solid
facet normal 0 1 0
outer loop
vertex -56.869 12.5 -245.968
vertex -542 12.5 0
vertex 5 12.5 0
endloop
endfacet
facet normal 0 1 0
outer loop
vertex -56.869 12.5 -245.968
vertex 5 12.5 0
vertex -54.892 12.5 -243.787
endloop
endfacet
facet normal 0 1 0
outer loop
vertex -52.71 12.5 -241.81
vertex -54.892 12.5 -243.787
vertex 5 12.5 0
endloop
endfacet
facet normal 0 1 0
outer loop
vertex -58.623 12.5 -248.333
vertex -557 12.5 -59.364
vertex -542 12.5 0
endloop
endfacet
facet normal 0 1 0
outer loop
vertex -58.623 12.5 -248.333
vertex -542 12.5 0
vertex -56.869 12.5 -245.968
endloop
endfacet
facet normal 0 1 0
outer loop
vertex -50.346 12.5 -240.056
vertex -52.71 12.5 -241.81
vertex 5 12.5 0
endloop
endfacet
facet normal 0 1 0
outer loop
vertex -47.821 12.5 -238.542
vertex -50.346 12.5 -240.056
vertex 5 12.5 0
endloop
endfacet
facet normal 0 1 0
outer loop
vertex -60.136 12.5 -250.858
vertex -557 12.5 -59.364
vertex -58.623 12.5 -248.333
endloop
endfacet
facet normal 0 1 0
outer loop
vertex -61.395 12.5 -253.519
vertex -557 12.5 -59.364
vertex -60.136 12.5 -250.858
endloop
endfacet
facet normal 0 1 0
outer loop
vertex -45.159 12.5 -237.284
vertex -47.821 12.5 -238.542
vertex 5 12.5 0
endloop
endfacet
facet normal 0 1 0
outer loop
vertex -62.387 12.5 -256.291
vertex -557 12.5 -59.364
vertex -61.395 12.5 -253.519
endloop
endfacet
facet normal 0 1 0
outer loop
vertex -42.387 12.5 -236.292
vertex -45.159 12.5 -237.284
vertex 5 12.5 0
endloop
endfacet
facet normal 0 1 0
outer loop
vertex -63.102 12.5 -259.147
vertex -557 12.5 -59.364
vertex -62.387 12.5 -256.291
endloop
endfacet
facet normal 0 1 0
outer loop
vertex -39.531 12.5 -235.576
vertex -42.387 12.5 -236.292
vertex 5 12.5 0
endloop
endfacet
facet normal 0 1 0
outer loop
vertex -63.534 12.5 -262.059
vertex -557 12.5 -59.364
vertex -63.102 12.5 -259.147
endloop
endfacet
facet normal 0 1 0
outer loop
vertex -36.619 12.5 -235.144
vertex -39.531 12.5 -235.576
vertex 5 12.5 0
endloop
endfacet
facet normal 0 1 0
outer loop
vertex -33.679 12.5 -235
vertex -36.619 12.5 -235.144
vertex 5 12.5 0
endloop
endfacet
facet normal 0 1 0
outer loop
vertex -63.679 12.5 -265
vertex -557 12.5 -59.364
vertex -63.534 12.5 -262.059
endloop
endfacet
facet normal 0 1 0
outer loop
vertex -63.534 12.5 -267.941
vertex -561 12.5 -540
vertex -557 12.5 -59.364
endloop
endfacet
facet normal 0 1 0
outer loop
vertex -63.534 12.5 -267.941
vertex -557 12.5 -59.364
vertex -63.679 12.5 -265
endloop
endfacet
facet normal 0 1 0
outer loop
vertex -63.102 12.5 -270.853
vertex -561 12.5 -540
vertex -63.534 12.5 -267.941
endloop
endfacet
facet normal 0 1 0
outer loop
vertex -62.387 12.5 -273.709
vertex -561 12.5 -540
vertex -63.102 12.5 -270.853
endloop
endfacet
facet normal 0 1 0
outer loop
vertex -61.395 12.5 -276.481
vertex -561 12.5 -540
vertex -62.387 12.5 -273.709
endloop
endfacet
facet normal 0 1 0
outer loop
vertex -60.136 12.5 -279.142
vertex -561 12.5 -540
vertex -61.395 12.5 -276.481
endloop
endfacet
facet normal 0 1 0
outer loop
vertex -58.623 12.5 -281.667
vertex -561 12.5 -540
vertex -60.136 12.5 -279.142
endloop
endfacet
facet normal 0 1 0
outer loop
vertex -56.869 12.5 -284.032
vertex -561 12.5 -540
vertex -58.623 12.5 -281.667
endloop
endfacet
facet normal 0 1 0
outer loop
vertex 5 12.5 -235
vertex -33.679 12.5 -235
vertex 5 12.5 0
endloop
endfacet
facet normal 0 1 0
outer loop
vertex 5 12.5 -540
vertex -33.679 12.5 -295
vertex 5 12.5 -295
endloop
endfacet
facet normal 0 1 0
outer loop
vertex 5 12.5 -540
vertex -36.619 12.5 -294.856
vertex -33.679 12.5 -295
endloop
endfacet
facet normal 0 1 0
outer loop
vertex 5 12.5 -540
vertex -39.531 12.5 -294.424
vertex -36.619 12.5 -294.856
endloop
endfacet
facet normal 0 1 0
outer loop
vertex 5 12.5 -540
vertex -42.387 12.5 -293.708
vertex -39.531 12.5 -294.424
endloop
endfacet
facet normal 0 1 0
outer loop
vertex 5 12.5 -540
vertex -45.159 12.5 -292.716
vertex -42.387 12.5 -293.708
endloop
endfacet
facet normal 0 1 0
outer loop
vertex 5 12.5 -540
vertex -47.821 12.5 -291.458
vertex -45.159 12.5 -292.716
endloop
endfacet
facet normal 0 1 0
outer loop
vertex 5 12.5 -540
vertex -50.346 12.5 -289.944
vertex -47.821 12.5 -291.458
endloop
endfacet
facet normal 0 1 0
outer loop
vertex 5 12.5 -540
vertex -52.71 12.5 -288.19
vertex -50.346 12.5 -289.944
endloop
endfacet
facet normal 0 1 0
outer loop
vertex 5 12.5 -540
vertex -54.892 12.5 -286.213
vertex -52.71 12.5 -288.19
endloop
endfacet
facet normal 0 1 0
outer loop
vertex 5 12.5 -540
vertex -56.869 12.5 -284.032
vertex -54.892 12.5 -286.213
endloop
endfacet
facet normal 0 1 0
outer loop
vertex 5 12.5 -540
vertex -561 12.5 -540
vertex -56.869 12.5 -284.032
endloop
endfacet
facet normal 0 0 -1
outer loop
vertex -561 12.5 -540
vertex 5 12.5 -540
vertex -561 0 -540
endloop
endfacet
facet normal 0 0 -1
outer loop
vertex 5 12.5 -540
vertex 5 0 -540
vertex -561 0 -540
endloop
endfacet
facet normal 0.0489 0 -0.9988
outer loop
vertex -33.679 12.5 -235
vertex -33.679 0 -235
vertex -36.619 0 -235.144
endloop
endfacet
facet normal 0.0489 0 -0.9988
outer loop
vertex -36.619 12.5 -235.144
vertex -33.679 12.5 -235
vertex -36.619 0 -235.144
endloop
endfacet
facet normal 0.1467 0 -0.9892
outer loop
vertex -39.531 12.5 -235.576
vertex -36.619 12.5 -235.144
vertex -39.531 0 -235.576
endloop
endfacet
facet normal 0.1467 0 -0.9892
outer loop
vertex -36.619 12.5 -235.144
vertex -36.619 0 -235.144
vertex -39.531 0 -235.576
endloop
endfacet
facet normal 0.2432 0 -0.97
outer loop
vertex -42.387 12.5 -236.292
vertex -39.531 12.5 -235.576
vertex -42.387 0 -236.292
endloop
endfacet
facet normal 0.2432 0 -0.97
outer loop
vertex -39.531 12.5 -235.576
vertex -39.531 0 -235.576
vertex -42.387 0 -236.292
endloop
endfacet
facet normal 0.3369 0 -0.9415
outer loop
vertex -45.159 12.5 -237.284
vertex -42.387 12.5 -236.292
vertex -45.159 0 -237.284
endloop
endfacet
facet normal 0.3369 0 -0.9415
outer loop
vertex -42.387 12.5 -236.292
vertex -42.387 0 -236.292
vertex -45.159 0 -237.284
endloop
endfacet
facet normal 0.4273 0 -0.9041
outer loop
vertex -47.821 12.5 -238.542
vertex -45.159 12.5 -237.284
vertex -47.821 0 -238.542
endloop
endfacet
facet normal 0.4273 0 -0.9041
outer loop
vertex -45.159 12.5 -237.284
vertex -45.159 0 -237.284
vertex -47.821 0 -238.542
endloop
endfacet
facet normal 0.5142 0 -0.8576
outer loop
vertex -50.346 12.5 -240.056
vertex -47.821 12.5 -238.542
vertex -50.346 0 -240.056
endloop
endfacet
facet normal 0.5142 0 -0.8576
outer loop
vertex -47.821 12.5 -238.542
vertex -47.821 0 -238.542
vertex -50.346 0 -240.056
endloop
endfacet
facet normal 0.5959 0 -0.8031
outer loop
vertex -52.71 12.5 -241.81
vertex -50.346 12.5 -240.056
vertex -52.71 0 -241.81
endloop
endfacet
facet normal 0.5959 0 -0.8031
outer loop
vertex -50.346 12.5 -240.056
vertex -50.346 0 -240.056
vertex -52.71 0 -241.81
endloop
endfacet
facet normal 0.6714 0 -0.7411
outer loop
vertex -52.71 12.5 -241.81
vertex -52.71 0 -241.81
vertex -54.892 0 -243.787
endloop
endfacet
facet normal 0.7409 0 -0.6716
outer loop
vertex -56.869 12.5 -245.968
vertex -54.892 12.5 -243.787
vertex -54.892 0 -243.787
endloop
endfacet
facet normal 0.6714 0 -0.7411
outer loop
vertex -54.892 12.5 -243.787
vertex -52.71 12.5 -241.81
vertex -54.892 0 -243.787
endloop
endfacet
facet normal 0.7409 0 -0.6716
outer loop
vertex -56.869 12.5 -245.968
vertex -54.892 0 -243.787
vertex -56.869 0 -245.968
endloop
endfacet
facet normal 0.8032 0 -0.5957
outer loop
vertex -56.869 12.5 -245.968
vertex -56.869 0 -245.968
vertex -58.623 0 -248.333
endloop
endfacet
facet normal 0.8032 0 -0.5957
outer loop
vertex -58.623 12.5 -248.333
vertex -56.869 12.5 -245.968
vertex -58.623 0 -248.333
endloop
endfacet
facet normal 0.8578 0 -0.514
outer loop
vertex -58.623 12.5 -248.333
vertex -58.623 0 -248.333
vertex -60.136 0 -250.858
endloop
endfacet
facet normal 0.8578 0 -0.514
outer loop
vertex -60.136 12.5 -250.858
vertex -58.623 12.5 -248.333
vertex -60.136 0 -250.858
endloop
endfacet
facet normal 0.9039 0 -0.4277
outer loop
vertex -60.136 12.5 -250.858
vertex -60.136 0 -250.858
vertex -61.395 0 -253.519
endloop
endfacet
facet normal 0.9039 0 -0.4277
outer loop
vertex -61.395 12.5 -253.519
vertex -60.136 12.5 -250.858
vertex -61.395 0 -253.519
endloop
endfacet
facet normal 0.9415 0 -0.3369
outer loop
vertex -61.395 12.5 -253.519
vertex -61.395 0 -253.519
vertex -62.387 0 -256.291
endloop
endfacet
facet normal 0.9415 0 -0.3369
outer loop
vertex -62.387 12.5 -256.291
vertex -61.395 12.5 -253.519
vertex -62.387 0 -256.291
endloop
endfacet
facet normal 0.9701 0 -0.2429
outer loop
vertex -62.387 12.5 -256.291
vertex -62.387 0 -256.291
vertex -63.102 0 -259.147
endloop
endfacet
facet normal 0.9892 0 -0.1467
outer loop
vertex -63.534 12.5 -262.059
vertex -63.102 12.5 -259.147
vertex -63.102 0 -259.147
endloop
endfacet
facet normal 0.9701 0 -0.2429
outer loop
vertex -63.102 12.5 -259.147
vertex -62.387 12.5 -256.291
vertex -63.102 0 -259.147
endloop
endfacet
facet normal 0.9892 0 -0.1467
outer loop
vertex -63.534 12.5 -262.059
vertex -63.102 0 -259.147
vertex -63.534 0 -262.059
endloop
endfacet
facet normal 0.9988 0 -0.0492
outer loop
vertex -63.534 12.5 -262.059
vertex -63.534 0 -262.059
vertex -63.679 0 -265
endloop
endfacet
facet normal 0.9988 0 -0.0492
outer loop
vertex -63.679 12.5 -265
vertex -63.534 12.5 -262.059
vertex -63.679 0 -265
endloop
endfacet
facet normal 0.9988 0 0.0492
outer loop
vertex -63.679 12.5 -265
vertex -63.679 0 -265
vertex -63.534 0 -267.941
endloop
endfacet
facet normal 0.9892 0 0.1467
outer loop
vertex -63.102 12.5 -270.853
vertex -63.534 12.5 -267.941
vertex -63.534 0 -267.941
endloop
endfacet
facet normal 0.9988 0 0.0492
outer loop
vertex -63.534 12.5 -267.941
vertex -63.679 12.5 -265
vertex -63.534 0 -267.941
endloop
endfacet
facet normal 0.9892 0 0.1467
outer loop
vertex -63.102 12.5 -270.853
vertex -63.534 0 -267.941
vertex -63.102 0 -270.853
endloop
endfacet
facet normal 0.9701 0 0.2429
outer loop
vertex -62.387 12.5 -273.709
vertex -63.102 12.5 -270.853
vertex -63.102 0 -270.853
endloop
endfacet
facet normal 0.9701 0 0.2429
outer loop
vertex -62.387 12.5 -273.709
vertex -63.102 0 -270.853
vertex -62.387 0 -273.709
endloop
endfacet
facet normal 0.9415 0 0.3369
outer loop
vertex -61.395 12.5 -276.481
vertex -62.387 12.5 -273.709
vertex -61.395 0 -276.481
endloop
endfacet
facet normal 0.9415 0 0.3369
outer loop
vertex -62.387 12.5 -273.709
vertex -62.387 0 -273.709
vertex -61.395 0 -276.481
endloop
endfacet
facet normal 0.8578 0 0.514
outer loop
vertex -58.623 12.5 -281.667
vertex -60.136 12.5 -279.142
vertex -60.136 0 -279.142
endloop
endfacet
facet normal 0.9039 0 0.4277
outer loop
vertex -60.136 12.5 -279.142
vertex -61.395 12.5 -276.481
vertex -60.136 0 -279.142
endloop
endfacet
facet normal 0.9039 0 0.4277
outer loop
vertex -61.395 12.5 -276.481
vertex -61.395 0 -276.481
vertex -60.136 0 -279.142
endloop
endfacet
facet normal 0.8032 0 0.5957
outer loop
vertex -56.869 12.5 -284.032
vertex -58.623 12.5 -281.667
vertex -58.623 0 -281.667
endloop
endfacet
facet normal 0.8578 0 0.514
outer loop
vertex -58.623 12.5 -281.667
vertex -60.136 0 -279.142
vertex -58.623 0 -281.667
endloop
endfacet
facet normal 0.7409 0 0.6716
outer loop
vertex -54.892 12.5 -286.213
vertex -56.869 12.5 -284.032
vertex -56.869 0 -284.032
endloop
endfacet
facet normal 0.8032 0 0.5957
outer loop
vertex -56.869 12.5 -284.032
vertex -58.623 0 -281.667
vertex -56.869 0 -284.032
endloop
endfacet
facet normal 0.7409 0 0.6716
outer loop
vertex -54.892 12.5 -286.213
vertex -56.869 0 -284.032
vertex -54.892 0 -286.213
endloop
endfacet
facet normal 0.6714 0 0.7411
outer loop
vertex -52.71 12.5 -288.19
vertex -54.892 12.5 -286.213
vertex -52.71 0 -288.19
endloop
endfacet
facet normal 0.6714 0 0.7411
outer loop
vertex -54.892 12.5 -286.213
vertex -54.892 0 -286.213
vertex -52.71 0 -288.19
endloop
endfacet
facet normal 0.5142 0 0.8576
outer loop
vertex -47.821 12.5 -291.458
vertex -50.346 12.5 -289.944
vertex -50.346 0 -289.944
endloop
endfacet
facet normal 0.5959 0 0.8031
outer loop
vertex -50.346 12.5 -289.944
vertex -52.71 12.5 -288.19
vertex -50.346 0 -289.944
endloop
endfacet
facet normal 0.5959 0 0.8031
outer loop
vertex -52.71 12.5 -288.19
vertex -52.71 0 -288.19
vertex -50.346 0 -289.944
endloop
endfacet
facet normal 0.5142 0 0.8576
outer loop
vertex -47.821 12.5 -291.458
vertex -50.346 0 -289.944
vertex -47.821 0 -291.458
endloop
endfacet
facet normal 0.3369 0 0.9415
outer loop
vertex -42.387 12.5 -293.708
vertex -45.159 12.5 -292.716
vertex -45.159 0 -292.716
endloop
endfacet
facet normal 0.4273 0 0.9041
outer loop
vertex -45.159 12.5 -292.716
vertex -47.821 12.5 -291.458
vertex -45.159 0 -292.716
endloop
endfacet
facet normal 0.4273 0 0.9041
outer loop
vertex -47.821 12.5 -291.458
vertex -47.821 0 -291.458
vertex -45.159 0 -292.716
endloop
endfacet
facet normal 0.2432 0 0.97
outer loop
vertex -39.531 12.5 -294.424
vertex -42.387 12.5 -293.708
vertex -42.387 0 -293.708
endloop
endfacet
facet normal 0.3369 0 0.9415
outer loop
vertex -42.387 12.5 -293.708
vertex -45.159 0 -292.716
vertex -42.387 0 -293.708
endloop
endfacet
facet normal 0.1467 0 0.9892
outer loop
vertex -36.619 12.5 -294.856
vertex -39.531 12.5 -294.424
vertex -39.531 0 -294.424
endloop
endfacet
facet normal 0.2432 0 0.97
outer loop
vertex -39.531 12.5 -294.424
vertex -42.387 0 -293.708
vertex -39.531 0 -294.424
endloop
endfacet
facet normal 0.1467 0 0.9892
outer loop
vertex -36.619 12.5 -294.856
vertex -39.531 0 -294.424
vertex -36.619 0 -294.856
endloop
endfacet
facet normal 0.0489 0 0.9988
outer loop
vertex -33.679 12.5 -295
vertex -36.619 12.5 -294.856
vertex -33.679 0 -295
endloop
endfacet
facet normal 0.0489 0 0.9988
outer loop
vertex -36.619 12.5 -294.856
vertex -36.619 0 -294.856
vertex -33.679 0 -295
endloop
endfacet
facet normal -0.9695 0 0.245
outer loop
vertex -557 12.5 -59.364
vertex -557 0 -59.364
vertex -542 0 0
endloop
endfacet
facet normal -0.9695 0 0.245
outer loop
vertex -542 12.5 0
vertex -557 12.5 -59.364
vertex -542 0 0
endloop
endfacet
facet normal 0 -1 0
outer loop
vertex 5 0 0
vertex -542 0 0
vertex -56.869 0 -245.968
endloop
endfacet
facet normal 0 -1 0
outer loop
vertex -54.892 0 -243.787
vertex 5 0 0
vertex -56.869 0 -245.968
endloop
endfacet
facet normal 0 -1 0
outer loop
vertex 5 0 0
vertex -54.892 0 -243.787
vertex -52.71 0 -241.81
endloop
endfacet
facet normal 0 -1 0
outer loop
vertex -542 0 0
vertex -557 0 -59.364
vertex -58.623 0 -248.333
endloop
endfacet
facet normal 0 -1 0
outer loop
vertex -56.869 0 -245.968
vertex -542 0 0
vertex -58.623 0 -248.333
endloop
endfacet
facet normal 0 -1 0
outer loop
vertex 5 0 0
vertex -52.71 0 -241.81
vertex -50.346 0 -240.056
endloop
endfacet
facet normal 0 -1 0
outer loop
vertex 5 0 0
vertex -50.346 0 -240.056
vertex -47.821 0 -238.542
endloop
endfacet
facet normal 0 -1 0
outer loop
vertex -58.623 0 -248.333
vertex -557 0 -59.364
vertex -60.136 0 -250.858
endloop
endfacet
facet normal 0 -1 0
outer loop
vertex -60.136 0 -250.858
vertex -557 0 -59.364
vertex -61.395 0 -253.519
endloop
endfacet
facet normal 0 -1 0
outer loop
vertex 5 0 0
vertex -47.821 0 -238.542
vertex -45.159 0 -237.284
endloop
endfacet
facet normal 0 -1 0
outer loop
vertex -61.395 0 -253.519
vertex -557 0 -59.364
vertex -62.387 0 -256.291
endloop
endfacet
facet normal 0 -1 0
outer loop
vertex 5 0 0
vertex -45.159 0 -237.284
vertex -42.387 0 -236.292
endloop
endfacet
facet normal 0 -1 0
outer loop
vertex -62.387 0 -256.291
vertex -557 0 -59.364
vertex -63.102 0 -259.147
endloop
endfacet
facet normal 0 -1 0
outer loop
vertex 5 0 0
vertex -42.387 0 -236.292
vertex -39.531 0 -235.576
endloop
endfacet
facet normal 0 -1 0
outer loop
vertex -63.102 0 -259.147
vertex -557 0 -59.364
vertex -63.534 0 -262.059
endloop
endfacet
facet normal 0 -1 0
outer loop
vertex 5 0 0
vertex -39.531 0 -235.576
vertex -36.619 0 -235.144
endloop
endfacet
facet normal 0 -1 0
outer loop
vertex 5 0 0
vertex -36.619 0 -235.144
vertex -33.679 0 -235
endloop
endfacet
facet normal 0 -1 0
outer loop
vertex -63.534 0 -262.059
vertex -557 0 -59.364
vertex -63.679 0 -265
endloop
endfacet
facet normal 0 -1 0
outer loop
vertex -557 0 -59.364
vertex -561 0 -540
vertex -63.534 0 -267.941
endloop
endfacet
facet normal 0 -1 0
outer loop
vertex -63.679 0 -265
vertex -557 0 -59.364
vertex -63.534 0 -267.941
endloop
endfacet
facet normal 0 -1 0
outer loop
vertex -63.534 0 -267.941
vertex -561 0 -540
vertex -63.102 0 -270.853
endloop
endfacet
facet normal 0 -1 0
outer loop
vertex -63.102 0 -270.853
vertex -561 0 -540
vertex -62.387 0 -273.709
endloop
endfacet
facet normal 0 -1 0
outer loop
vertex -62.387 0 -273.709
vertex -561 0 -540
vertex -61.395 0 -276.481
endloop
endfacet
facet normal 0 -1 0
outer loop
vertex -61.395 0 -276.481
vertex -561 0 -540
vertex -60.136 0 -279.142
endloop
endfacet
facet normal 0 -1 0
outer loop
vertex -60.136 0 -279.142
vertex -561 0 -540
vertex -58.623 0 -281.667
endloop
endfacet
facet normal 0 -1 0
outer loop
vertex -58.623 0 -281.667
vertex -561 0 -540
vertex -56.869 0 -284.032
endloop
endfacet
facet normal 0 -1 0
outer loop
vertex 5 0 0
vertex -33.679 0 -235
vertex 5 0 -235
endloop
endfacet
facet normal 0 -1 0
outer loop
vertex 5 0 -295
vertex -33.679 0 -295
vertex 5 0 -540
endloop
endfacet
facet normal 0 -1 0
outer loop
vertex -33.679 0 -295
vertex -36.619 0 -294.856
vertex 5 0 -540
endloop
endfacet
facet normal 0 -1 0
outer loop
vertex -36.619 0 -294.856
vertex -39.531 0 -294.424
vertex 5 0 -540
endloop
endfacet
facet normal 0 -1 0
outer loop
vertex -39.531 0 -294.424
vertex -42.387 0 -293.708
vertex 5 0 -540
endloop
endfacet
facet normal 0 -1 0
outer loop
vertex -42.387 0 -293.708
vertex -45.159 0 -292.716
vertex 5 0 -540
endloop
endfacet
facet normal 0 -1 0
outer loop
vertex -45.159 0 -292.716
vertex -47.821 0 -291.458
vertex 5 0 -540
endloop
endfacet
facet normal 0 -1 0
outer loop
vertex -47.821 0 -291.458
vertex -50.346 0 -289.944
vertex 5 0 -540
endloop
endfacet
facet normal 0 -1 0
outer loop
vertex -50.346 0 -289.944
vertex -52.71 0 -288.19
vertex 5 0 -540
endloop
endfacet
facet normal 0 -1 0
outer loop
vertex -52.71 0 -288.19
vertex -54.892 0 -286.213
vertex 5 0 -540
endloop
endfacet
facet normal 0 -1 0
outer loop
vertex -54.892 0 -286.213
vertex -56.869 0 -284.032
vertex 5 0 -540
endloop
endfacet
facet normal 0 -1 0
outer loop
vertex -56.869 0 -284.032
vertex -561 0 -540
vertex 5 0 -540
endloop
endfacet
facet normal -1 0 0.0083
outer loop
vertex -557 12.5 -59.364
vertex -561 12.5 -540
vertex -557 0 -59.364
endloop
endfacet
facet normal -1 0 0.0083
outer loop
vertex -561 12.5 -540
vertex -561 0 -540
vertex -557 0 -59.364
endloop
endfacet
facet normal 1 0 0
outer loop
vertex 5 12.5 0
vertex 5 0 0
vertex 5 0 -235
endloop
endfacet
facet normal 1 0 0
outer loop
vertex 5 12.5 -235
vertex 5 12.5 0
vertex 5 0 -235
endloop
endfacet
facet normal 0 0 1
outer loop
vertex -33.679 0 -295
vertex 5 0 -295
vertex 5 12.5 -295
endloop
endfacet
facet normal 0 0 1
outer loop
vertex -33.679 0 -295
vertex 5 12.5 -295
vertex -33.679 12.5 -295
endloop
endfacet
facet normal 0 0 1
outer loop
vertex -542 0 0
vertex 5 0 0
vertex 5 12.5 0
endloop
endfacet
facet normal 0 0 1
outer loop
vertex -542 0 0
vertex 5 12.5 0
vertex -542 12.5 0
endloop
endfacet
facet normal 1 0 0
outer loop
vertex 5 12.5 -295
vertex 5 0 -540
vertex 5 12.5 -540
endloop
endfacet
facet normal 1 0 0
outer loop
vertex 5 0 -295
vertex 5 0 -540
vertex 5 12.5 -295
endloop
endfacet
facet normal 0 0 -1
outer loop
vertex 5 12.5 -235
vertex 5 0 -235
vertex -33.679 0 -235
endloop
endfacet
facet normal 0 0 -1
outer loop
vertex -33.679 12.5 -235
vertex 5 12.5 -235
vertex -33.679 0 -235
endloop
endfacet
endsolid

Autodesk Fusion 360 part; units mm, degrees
sketch "Sketch1" plane through (0, 0, 0) normal (0, 1, 0) x (1, 0, 0)
  line L0 (5, 0) -> (-542, 0)
  line L1 (5, 540) -> (-561, 540)
  line L2 (5, 540) -> (5, 295)
  line L3 (5, 540) -> (5, 295)
  line L4 (5, 295) -> (-33.6787, 295)
  line L5 (5, 235) -> (-33.6787, 235)
  line L6 (-557, 59.3636) -> (-542, 0)
  arc A0 (-33.6787, 295) -> (-33.6787, 235) centre (-33.6787, 265) ccw
  line L7 (5, 0) -> (5, 235)
  line L8 (5, 295) -> (5, 540)
  line L9 (-561, 540) -> (-557, 59.3636)
  dimension "d1" = 540
  dimension "d2" = 547
  dimension "d3" = 566
  dimension "d4" = 245
  dimension "d5" = 305
  dimension "d11" = 60
  dimension "d12" = 562
extrude "Extrude1" add sketch "Sketch1" along normal blind 12.5
equation "d3 = 562 mm + 4 mm"
